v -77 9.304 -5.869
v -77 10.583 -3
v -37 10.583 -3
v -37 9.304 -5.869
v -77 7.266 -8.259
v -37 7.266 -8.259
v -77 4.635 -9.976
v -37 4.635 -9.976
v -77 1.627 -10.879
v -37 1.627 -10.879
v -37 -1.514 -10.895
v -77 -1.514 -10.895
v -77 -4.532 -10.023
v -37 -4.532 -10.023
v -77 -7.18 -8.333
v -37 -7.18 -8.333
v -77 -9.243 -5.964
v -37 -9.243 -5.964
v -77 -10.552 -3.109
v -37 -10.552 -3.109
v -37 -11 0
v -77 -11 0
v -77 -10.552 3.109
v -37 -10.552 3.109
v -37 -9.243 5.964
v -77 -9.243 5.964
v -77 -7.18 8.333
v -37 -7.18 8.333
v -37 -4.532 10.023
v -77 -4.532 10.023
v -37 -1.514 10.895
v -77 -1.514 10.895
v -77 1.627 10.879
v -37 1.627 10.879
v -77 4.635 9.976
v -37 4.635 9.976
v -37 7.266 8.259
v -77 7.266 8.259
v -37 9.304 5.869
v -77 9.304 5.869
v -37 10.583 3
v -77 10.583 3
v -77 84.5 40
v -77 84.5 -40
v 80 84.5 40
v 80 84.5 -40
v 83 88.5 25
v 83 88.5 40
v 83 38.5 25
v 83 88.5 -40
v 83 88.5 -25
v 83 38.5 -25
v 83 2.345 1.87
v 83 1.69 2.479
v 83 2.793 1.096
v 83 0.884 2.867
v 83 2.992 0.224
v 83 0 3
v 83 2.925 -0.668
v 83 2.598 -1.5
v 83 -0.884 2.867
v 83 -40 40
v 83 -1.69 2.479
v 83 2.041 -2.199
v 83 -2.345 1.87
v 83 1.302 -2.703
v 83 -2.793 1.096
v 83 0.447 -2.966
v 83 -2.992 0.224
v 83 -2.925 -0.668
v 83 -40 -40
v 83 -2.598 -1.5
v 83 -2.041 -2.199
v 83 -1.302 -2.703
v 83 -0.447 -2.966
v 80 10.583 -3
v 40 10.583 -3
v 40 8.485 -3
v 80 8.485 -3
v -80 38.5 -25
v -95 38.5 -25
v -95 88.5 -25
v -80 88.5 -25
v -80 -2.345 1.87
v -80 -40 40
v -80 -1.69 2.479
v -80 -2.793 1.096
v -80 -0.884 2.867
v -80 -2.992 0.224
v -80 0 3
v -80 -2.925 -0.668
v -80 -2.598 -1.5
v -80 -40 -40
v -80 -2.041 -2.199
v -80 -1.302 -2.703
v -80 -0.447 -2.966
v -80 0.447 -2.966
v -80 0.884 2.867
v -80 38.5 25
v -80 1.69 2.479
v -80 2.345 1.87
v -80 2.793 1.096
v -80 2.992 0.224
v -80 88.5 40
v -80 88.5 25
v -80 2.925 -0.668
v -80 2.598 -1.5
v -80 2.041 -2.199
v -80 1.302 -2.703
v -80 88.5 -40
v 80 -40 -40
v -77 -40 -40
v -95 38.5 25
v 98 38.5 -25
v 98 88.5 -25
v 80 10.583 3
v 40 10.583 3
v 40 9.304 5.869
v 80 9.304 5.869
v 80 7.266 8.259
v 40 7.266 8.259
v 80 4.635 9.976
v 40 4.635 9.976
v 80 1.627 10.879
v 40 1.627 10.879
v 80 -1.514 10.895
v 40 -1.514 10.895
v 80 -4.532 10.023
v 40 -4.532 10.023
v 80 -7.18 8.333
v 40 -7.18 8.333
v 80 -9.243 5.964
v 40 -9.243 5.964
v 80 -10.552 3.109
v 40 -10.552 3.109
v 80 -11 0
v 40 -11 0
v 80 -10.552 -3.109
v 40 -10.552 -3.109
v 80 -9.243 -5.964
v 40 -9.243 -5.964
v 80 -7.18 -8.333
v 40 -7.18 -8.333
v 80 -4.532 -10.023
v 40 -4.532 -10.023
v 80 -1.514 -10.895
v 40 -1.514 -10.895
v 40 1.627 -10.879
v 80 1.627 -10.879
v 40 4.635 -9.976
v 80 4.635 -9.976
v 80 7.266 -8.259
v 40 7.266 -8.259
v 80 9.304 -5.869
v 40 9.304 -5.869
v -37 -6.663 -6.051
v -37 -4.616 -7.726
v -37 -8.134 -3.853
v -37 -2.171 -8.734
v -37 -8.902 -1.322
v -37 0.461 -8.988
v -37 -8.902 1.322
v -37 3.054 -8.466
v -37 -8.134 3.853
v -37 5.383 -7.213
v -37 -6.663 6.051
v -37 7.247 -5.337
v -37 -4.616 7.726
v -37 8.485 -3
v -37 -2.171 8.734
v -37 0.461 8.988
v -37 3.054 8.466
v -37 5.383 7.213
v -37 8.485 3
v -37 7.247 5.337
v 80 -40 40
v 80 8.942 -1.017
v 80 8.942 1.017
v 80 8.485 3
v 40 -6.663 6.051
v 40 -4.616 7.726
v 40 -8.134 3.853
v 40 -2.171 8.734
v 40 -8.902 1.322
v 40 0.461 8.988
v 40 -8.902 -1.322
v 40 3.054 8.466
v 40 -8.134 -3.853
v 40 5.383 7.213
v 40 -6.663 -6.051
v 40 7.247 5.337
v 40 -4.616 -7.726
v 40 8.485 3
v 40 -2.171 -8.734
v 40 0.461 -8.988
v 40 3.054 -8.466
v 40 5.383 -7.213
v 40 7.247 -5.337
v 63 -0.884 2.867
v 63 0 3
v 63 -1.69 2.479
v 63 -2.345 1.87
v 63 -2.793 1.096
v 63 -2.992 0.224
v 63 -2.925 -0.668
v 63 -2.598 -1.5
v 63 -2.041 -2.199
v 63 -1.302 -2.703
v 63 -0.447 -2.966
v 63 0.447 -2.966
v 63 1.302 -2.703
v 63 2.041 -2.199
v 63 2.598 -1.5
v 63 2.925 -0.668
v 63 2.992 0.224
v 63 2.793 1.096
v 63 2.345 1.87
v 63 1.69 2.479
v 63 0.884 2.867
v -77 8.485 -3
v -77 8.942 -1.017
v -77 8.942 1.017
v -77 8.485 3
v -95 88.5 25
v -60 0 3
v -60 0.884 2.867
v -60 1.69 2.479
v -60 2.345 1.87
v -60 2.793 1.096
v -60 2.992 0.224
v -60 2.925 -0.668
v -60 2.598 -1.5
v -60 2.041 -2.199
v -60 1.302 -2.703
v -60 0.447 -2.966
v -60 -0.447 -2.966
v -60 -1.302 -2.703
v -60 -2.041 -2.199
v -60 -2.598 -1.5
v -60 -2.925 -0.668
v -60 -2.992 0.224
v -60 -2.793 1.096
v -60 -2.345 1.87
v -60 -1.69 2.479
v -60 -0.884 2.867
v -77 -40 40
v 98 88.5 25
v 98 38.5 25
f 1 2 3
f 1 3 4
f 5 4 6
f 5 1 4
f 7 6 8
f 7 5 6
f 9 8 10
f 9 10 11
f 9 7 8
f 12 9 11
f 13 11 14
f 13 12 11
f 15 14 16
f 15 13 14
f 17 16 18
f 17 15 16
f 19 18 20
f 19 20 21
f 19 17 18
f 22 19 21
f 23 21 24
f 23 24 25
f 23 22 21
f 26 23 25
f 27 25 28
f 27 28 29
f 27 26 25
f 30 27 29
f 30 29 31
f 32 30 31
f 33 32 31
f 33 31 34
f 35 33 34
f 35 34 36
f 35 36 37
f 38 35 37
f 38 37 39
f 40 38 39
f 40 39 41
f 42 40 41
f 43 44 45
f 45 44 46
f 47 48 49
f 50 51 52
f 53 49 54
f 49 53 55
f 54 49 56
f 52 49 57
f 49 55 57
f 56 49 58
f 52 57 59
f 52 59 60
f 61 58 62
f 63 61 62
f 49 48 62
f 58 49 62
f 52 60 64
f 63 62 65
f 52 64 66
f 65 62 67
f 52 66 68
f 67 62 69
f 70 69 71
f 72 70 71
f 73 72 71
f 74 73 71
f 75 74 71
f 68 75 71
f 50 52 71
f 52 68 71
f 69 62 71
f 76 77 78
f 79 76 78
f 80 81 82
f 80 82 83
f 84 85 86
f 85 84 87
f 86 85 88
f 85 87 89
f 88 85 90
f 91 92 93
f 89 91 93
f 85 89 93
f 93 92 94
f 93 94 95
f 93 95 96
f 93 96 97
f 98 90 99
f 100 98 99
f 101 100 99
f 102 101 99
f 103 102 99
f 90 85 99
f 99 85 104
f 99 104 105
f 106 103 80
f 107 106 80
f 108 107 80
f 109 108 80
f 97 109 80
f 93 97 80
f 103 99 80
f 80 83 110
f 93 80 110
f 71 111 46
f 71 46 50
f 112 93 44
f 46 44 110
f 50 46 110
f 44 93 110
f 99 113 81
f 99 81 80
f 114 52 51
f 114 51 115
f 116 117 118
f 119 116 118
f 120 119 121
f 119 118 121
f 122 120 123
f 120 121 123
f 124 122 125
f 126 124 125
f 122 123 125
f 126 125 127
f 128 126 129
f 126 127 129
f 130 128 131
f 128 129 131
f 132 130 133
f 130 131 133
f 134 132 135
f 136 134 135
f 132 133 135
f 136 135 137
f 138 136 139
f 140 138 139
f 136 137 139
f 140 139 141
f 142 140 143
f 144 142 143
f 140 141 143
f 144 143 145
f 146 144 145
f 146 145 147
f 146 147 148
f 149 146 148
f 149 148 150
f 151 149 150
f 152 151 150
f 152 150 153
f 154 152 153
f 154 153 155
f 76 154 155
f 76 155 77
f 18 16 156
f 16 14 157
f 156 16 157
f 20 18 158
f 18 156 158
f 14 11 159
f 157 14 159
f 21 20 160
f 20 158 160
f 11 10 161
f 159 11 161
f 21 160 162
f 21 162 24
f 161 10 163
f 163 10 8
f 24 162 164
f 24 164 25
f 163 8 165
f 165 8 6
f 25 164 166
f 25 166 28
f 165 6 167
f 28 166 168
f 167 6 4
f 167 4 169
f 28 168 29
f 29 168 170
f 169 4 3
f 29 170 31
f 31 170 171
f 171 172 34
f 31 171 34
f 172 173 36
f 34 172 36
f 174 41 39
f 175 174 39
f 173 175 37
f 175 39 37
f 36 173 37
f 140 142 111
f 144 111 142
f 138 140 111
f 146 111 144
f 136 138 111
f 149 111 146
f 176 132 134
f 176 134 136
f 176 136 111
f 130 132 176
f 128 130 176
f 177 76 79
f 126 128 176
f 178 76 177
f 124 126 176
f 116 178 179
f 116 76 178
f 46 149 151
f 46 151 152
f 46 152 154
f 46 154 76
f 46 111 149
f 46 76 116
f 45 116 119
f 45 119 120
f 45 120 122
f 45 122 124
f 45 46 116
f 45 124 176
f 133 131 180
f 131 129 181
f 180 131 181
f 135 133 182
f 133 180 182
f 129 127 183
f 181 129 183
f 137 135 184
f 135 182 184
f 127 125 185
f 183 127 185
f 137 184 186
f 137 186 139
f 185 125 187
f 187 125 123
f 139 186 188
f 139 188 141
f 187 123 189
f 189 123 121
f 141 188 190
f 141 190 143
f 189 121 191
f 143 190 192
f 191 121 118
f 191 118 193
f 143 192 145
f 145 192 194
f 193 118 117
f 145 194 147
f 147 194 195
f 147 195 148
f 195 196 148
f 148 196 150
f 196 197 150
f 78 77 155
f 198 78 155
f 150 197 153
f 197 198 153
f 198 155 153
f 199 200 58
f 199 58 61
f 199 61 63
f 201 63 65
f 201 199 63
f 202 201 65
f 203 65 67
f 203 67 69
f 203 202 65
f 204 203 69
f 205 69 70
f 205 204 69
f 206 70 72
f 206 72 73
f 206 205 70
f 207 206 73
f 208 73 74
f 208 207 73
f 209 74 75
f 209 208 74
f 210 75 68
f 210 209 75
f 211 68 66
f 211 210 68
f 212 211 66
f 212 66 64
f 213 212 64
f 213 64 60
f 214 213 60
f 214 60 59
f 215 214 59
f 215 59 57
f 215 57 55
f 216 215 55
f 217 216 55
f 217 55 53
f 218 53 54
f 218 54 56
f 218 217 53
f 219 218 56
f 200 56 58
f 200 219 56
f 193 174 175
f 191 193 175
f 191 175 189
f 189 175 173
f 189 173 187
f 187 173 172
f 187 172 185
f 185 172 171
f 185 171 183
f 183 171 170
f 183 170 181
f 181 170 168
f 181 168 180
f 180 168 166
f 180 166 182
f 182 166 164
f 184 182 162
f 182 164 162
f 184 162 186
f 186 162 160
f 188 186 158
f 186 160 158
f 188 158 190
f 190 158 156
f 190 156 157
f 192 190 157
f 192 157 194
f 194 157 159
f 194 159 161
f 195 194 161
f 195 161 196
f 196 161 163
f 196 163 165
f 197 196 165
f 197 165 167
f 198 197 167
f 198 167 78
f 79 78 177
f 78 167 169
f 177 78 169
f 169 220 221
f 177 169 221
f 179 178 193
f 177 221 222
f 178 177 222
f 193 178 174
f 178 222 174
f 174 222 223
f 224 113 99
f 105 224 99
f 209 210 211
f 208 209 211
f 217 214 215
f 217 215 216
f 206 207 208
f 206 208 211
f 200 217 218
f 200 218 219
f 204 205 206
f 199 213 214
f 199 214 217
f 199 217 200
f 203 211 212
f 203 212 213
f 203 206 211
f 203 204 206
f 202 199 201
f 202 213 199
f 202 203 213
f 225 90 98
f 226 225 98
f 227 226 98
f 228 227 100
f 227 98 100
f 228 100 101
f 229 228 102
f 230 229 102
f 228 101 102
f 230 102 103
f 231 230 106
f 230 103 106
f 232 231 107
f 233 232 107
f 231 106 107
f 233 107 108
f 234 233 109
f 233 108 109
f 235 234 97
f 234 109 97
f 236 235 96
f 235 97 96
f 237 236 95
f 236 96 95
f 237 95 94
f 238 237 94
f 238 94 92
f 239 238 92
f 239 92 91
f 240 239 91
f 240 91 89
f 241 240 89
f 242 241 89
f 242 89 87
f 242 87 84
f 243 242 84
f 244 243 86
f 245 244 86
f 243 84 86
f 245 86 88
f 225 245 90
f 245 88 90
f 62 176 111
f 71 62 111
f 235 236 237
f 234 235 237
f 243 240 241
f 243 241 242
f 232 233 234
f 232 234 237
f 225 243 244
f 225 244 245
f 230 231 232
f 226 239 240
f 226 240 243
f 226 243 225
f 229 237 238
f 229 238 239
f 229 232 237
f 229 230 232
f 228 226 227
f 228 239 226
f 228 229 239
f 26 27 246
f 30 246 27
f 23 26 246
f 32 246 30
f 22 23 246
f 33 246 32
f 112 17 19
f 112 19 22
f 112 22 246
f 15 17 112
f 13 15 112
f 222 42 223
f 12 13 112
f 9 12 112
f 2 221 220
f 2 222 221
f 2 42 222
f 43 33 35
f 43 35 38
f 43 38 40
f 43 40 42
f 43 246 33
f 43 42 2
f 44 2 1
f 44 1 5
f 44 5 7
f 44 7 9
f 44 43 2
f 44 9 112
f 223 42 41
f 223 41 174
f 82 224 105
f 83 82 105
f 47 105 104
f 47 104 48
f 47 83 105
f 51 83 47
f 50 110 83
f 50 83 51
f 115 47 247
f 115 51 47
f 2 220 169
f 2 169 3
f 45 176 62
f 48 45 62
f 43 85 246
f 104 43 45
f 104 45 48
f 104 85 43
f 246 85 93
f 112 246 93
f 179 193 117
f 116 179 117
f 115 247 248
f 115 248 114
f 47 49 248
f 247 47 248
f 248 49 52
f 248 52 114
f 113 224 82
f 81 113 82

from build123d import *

# Parameters (mm, degrees)
SALIENTE_EXTRUIR1_START = 80
SALIENTE_EXTRUIR1_DEPTH = 3
SALIENTE_EXTRUIR2_START = 40
SALIENTE_EXTRUIR2_DEPTH = 40
SALIENTE_EXTRUIR3_START = -80
CROQUIS3_W              = 80
CROQUIS3_H              = 128.485281374
SALIENTE_EXTRUIR3_DEPTH = 3
SALIENTE_EXTRUIR4_DEPTH = 40
SALIENTE_EXTRUIR5_START = 84.5
CROQUIS5_W              = 163
CROQUIS5_H              = 80
SALIENTE_EXTRUIR5_DEPTH = 4
SALIENTE_EXTRUIR6_START = -3
SALIENTE_EXTRUIR6_DEPTH = 3
SALIENTE_EXTRUIR7_START = 88.5
CROQUIS7_W              = 15
CROQUIS7_H              = 50
SALIENTE_EXTRUIR7_DEPTH = 50
CROQUIS8_R              = 9
SALIENTE_EXTRUIR8_DEPTH = 157
CROQUIS10_R             = 3
CORTAR_EXTRUIR1_DEPTH   = 20
CORTAR_EXTRUIR2_START   = -20
CROQUIS11_R             = 3
CORTAR_EXTRUIR2_DEPTH   = 20


with BuildPart() as part:
    # Croquis1 → Saliente-Extruir1 (new body)
    with BuildSketch(Plane(origin=(0, 0, 0), x_dir=(0, 0, -1), z_dir=(1, 0, 0)).offset(SALIENTE_EXTRUIR1_START)):
        Polygon((-40, 8.485281374), (-40, -40), (40, -40), (40, 8.485281374), (40, 40), (40, 88.485281374), (-40, 88.485281374), (-40, 40), align=None)
        with BuildLine():
            Line((-3, 12), (0, 12))
            Line((0, 12), (3, 12))
            Line((3, 12), (3, 8.485281374))
            ThreePointArc((3, 8.485281374), (0, -9), (-3, 8.485281374))
            Line((-3, 8.485281374), (-3, 12))
        make_face(mode=Mode.SUBTRACT)
    extrude(amount=SALIENTE_EXTRUIR1_DEPTH)

    # Croquis2 → Saliente-Extruir2 (add)
    with BuildSketch(Plane.ZY.offset(-80).offset(SALIENTE_EXTRUIR2_START)):
        with BuildLine():
            Line((3, 8.485281374), (3, 10.583005244))
            ThreePointArc((3, 10.583005244), (0, -11), (-3, 10.583005244))
            Line((-3, 10.583005244), (-3, 8.485281374))
            ThreePointArc((-3, 8.485281374), (0, -9), (3, 8.485281374))
        make_face()
    extrude(amount=-SALIENTE_EXTRUIR2_DEPTH)



with BuildPart() as body_2:
    # Croquis3 → Saliente-Extruir3 (new body)
    with BuildSketch(Plane(origin=(0, 0, 0), x_dir=(0, 0, -1), z_dir=(1, 0, 0)).offset(SALIENTE_EXTRUIR3_START)):
        with Locations((0, 24.242640687)):
            Rectangle(CROQUIS3_W, CROQUIS3_H)
    extrude(amount=SALIENTE_EXTRUIR3_DEPTH)

    # Croquis4 → Saliente-Extruir4 (add)
    with BuildSketch(Plane(origin=(-77, 0, 0), x_dir=(0, 0, -1), z_dir=(1, 0, 0))):
        with BuildLine():
            Line((-3, 10.583005244), (-3, 8.485281374))
            ThreePointArc((-3, 8.485281374), (0, -9), (3, 8.485281374))
            Line((3, 8.485281374), (3, 10.583005244))
            ThreePointArc((3, 10.583005244), (0, -11), (-3, 10.583005244))
        make_face()
    extrude(amount=SALIENTE_EXTRUIR4_DEPTH)


with BuildPart() as part_1:
    add(part.part)

    add(body_2.part)  # Saliente-Extruir5 merges body 2
    # Croquis5 → Saliente-Extruir5 (add)
    with BuildSketch(Plane(origin=(0, 0, 0), x_dir=(1, 0, 0), z_dir=(0, 1, 0)).offset(SALIENTE_EXTRUIR5_START)):
        with Locations((1.5, 0)):
            Rectangle(CROQUIS5_W, CROQUIS5_H)
    extrude(amount=SALIENTE_EXTRUIR5_DEPTH)

    # Croquis6 → Saliente-Extruir6 (add)
    with BuildSketch(Plane(origin=(83, 0, 0), x_dir=(0, 0, -1), z_dir=(1, 0, 0)).offset(SALIENTE_EXTRUIR6_START)):
        with BuildLine():
            Line((3, 12), (3, 8.485281374))
            ThreePointArc((3, 8.485281374), (0, -9), (-3, 8.485281374))
            Line((-3, 8.485281374), (-3, 12))
            Line((-3, 12), (3, 12))
        make_face()
    extrude(amount=SALIENTE_EXTRUIR6_DEPTH)

    # Croquis7 → Saliente-Extruir7 (add)
    with BuildSketch(Plane(origin=(0, 0, 0), x_dir=(1, 0, 0), z_dir=(0, 1, 0)).offset(SALIENTE_EXTRUIR7_START)):
        with Locations((-87.5, 0)):
            Rectangle(CROQUIS7_W, CROQUIS7_H)
        with Locations((90.5, 0)):
            Rectangle(CROQUIS7_W, CROQUIS7_H)
    extrude(amount=-SALIENTE_EXTRUIR7_DEPTH)

    # Croquis8 → Saliente-Extruir8 (add)
    with BuildSketch(Plane(origin=(-77, 0, 0), x_dir=(0, 0, -1), z_dir=(1, 0, 0))):
        with Locations(Location((0, 0, 0), (0, 0, 109.471220634))):
            Circle(CROQUIS8_R)
    extrude(amount=SALIENTE_EXTRUIR8_DEPTH)

    # Croquis10 → Cortar-Extruir1 (cut)
    with BuildSketch(Plane.ZY.offset(80)):
        Circle(CROQUIS10_R)
    extrude(amount=-CORTAR_EXTRUIR1_DEPTH, mode=Mode.SUBTRACT)

    # Croquis11 → Cortar-Extruir2 (cut)
    with BuildSketch(Plane(origin=(83, 0, 0), x_dir=(0, 0, -1), z_dir=(1, 0, 0)).offset(CORTAR_EXTRUIR2_START)):
        with Locations(Location((0, 0, 0), (0, 0, 180))):
            Circle(CROQUIS11_R)
    extrude(amount=CORTAR_EXTRUIR2_DEPTH, mode=Mode.SUBTRACT)


solid = part_1.part
